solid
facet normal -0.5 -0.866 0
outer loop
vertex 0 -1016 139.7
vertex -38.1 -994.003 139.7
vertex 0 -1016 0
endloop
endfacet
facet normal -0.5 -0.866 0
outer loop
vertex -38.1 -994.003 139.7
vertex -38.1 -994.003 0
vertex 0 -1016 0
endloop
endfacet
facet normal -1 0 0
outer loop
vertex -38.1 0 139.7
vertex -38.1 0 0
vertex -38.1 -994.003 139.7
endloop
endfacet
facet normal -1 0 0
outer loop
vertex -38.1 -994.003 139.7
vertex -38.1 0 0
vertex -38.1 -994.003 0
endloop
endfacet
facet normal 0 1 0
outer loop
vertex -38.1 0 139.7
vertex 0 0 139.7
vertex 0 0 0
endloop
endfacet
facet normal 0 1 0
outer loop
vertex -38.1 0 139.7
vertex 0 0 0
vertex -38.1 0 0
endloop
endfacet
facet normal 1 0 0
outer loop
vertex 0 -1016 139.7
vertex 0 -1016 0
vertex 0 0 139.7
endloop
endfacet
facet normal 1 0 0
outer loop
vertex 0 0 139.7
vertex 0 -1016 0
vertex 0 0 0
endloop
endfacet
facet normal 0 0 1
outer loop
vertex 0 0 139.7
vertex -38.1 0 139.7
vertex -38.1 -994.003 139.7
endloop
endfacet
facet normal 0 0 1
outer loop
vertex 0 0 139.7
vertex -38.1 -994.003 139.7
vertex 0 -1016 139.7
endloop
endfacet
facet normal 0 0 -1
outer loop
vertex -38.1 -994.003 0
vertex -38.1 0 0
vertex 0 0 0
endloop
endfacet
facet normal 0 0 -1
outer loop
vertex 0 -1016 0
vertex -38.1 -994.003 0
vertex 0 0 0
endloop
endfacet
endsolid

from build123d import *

# Parameters (mm, degrees)
F0_W     = 38.1
F0_H     = 88.9
F1_DEPTH = 1016
F4_DEPTH = 88.9
F5_DEPTH = 50.8


with BuildPart() as f1:
    # F0 (on Front) → F1 (new body)
    with BuildSketch(Plane.XZ):
        with Locations((-19.05, 44.45)):
            Rectangle(F0_W, F0_H)
    extrude(amount=F1_DEPTH)

    # F3 (on face) → F4 (cut)
    with BuildSketch(Plane.XY.offset(88.9)):
        Polygon((-38.1, -1016), (0, -1016), (-38.1, -994.002955), align=None)
    extrude(amount=-F4_DEPTH, mode=Mode.SUBTRACT)

    # F1_face (on face) → F5 (join)
    with BuildSketch(Plane(origin=(-19.05, -508, 88.9), x_dir=(1, 0, 0), z_dir=(0, 0, 1))):
        Polygon((19.05, 508), (-19.05, 508), (-19.05, -486.002955), (19.05, -508), align=None)
    extrude(amount=F5_DEPTH)


with BuildPart() as f2_1:
    # F2: copy of F1
    add(f1.part.moved(Location((76.2, 0, 0))))


solid = f1.part
